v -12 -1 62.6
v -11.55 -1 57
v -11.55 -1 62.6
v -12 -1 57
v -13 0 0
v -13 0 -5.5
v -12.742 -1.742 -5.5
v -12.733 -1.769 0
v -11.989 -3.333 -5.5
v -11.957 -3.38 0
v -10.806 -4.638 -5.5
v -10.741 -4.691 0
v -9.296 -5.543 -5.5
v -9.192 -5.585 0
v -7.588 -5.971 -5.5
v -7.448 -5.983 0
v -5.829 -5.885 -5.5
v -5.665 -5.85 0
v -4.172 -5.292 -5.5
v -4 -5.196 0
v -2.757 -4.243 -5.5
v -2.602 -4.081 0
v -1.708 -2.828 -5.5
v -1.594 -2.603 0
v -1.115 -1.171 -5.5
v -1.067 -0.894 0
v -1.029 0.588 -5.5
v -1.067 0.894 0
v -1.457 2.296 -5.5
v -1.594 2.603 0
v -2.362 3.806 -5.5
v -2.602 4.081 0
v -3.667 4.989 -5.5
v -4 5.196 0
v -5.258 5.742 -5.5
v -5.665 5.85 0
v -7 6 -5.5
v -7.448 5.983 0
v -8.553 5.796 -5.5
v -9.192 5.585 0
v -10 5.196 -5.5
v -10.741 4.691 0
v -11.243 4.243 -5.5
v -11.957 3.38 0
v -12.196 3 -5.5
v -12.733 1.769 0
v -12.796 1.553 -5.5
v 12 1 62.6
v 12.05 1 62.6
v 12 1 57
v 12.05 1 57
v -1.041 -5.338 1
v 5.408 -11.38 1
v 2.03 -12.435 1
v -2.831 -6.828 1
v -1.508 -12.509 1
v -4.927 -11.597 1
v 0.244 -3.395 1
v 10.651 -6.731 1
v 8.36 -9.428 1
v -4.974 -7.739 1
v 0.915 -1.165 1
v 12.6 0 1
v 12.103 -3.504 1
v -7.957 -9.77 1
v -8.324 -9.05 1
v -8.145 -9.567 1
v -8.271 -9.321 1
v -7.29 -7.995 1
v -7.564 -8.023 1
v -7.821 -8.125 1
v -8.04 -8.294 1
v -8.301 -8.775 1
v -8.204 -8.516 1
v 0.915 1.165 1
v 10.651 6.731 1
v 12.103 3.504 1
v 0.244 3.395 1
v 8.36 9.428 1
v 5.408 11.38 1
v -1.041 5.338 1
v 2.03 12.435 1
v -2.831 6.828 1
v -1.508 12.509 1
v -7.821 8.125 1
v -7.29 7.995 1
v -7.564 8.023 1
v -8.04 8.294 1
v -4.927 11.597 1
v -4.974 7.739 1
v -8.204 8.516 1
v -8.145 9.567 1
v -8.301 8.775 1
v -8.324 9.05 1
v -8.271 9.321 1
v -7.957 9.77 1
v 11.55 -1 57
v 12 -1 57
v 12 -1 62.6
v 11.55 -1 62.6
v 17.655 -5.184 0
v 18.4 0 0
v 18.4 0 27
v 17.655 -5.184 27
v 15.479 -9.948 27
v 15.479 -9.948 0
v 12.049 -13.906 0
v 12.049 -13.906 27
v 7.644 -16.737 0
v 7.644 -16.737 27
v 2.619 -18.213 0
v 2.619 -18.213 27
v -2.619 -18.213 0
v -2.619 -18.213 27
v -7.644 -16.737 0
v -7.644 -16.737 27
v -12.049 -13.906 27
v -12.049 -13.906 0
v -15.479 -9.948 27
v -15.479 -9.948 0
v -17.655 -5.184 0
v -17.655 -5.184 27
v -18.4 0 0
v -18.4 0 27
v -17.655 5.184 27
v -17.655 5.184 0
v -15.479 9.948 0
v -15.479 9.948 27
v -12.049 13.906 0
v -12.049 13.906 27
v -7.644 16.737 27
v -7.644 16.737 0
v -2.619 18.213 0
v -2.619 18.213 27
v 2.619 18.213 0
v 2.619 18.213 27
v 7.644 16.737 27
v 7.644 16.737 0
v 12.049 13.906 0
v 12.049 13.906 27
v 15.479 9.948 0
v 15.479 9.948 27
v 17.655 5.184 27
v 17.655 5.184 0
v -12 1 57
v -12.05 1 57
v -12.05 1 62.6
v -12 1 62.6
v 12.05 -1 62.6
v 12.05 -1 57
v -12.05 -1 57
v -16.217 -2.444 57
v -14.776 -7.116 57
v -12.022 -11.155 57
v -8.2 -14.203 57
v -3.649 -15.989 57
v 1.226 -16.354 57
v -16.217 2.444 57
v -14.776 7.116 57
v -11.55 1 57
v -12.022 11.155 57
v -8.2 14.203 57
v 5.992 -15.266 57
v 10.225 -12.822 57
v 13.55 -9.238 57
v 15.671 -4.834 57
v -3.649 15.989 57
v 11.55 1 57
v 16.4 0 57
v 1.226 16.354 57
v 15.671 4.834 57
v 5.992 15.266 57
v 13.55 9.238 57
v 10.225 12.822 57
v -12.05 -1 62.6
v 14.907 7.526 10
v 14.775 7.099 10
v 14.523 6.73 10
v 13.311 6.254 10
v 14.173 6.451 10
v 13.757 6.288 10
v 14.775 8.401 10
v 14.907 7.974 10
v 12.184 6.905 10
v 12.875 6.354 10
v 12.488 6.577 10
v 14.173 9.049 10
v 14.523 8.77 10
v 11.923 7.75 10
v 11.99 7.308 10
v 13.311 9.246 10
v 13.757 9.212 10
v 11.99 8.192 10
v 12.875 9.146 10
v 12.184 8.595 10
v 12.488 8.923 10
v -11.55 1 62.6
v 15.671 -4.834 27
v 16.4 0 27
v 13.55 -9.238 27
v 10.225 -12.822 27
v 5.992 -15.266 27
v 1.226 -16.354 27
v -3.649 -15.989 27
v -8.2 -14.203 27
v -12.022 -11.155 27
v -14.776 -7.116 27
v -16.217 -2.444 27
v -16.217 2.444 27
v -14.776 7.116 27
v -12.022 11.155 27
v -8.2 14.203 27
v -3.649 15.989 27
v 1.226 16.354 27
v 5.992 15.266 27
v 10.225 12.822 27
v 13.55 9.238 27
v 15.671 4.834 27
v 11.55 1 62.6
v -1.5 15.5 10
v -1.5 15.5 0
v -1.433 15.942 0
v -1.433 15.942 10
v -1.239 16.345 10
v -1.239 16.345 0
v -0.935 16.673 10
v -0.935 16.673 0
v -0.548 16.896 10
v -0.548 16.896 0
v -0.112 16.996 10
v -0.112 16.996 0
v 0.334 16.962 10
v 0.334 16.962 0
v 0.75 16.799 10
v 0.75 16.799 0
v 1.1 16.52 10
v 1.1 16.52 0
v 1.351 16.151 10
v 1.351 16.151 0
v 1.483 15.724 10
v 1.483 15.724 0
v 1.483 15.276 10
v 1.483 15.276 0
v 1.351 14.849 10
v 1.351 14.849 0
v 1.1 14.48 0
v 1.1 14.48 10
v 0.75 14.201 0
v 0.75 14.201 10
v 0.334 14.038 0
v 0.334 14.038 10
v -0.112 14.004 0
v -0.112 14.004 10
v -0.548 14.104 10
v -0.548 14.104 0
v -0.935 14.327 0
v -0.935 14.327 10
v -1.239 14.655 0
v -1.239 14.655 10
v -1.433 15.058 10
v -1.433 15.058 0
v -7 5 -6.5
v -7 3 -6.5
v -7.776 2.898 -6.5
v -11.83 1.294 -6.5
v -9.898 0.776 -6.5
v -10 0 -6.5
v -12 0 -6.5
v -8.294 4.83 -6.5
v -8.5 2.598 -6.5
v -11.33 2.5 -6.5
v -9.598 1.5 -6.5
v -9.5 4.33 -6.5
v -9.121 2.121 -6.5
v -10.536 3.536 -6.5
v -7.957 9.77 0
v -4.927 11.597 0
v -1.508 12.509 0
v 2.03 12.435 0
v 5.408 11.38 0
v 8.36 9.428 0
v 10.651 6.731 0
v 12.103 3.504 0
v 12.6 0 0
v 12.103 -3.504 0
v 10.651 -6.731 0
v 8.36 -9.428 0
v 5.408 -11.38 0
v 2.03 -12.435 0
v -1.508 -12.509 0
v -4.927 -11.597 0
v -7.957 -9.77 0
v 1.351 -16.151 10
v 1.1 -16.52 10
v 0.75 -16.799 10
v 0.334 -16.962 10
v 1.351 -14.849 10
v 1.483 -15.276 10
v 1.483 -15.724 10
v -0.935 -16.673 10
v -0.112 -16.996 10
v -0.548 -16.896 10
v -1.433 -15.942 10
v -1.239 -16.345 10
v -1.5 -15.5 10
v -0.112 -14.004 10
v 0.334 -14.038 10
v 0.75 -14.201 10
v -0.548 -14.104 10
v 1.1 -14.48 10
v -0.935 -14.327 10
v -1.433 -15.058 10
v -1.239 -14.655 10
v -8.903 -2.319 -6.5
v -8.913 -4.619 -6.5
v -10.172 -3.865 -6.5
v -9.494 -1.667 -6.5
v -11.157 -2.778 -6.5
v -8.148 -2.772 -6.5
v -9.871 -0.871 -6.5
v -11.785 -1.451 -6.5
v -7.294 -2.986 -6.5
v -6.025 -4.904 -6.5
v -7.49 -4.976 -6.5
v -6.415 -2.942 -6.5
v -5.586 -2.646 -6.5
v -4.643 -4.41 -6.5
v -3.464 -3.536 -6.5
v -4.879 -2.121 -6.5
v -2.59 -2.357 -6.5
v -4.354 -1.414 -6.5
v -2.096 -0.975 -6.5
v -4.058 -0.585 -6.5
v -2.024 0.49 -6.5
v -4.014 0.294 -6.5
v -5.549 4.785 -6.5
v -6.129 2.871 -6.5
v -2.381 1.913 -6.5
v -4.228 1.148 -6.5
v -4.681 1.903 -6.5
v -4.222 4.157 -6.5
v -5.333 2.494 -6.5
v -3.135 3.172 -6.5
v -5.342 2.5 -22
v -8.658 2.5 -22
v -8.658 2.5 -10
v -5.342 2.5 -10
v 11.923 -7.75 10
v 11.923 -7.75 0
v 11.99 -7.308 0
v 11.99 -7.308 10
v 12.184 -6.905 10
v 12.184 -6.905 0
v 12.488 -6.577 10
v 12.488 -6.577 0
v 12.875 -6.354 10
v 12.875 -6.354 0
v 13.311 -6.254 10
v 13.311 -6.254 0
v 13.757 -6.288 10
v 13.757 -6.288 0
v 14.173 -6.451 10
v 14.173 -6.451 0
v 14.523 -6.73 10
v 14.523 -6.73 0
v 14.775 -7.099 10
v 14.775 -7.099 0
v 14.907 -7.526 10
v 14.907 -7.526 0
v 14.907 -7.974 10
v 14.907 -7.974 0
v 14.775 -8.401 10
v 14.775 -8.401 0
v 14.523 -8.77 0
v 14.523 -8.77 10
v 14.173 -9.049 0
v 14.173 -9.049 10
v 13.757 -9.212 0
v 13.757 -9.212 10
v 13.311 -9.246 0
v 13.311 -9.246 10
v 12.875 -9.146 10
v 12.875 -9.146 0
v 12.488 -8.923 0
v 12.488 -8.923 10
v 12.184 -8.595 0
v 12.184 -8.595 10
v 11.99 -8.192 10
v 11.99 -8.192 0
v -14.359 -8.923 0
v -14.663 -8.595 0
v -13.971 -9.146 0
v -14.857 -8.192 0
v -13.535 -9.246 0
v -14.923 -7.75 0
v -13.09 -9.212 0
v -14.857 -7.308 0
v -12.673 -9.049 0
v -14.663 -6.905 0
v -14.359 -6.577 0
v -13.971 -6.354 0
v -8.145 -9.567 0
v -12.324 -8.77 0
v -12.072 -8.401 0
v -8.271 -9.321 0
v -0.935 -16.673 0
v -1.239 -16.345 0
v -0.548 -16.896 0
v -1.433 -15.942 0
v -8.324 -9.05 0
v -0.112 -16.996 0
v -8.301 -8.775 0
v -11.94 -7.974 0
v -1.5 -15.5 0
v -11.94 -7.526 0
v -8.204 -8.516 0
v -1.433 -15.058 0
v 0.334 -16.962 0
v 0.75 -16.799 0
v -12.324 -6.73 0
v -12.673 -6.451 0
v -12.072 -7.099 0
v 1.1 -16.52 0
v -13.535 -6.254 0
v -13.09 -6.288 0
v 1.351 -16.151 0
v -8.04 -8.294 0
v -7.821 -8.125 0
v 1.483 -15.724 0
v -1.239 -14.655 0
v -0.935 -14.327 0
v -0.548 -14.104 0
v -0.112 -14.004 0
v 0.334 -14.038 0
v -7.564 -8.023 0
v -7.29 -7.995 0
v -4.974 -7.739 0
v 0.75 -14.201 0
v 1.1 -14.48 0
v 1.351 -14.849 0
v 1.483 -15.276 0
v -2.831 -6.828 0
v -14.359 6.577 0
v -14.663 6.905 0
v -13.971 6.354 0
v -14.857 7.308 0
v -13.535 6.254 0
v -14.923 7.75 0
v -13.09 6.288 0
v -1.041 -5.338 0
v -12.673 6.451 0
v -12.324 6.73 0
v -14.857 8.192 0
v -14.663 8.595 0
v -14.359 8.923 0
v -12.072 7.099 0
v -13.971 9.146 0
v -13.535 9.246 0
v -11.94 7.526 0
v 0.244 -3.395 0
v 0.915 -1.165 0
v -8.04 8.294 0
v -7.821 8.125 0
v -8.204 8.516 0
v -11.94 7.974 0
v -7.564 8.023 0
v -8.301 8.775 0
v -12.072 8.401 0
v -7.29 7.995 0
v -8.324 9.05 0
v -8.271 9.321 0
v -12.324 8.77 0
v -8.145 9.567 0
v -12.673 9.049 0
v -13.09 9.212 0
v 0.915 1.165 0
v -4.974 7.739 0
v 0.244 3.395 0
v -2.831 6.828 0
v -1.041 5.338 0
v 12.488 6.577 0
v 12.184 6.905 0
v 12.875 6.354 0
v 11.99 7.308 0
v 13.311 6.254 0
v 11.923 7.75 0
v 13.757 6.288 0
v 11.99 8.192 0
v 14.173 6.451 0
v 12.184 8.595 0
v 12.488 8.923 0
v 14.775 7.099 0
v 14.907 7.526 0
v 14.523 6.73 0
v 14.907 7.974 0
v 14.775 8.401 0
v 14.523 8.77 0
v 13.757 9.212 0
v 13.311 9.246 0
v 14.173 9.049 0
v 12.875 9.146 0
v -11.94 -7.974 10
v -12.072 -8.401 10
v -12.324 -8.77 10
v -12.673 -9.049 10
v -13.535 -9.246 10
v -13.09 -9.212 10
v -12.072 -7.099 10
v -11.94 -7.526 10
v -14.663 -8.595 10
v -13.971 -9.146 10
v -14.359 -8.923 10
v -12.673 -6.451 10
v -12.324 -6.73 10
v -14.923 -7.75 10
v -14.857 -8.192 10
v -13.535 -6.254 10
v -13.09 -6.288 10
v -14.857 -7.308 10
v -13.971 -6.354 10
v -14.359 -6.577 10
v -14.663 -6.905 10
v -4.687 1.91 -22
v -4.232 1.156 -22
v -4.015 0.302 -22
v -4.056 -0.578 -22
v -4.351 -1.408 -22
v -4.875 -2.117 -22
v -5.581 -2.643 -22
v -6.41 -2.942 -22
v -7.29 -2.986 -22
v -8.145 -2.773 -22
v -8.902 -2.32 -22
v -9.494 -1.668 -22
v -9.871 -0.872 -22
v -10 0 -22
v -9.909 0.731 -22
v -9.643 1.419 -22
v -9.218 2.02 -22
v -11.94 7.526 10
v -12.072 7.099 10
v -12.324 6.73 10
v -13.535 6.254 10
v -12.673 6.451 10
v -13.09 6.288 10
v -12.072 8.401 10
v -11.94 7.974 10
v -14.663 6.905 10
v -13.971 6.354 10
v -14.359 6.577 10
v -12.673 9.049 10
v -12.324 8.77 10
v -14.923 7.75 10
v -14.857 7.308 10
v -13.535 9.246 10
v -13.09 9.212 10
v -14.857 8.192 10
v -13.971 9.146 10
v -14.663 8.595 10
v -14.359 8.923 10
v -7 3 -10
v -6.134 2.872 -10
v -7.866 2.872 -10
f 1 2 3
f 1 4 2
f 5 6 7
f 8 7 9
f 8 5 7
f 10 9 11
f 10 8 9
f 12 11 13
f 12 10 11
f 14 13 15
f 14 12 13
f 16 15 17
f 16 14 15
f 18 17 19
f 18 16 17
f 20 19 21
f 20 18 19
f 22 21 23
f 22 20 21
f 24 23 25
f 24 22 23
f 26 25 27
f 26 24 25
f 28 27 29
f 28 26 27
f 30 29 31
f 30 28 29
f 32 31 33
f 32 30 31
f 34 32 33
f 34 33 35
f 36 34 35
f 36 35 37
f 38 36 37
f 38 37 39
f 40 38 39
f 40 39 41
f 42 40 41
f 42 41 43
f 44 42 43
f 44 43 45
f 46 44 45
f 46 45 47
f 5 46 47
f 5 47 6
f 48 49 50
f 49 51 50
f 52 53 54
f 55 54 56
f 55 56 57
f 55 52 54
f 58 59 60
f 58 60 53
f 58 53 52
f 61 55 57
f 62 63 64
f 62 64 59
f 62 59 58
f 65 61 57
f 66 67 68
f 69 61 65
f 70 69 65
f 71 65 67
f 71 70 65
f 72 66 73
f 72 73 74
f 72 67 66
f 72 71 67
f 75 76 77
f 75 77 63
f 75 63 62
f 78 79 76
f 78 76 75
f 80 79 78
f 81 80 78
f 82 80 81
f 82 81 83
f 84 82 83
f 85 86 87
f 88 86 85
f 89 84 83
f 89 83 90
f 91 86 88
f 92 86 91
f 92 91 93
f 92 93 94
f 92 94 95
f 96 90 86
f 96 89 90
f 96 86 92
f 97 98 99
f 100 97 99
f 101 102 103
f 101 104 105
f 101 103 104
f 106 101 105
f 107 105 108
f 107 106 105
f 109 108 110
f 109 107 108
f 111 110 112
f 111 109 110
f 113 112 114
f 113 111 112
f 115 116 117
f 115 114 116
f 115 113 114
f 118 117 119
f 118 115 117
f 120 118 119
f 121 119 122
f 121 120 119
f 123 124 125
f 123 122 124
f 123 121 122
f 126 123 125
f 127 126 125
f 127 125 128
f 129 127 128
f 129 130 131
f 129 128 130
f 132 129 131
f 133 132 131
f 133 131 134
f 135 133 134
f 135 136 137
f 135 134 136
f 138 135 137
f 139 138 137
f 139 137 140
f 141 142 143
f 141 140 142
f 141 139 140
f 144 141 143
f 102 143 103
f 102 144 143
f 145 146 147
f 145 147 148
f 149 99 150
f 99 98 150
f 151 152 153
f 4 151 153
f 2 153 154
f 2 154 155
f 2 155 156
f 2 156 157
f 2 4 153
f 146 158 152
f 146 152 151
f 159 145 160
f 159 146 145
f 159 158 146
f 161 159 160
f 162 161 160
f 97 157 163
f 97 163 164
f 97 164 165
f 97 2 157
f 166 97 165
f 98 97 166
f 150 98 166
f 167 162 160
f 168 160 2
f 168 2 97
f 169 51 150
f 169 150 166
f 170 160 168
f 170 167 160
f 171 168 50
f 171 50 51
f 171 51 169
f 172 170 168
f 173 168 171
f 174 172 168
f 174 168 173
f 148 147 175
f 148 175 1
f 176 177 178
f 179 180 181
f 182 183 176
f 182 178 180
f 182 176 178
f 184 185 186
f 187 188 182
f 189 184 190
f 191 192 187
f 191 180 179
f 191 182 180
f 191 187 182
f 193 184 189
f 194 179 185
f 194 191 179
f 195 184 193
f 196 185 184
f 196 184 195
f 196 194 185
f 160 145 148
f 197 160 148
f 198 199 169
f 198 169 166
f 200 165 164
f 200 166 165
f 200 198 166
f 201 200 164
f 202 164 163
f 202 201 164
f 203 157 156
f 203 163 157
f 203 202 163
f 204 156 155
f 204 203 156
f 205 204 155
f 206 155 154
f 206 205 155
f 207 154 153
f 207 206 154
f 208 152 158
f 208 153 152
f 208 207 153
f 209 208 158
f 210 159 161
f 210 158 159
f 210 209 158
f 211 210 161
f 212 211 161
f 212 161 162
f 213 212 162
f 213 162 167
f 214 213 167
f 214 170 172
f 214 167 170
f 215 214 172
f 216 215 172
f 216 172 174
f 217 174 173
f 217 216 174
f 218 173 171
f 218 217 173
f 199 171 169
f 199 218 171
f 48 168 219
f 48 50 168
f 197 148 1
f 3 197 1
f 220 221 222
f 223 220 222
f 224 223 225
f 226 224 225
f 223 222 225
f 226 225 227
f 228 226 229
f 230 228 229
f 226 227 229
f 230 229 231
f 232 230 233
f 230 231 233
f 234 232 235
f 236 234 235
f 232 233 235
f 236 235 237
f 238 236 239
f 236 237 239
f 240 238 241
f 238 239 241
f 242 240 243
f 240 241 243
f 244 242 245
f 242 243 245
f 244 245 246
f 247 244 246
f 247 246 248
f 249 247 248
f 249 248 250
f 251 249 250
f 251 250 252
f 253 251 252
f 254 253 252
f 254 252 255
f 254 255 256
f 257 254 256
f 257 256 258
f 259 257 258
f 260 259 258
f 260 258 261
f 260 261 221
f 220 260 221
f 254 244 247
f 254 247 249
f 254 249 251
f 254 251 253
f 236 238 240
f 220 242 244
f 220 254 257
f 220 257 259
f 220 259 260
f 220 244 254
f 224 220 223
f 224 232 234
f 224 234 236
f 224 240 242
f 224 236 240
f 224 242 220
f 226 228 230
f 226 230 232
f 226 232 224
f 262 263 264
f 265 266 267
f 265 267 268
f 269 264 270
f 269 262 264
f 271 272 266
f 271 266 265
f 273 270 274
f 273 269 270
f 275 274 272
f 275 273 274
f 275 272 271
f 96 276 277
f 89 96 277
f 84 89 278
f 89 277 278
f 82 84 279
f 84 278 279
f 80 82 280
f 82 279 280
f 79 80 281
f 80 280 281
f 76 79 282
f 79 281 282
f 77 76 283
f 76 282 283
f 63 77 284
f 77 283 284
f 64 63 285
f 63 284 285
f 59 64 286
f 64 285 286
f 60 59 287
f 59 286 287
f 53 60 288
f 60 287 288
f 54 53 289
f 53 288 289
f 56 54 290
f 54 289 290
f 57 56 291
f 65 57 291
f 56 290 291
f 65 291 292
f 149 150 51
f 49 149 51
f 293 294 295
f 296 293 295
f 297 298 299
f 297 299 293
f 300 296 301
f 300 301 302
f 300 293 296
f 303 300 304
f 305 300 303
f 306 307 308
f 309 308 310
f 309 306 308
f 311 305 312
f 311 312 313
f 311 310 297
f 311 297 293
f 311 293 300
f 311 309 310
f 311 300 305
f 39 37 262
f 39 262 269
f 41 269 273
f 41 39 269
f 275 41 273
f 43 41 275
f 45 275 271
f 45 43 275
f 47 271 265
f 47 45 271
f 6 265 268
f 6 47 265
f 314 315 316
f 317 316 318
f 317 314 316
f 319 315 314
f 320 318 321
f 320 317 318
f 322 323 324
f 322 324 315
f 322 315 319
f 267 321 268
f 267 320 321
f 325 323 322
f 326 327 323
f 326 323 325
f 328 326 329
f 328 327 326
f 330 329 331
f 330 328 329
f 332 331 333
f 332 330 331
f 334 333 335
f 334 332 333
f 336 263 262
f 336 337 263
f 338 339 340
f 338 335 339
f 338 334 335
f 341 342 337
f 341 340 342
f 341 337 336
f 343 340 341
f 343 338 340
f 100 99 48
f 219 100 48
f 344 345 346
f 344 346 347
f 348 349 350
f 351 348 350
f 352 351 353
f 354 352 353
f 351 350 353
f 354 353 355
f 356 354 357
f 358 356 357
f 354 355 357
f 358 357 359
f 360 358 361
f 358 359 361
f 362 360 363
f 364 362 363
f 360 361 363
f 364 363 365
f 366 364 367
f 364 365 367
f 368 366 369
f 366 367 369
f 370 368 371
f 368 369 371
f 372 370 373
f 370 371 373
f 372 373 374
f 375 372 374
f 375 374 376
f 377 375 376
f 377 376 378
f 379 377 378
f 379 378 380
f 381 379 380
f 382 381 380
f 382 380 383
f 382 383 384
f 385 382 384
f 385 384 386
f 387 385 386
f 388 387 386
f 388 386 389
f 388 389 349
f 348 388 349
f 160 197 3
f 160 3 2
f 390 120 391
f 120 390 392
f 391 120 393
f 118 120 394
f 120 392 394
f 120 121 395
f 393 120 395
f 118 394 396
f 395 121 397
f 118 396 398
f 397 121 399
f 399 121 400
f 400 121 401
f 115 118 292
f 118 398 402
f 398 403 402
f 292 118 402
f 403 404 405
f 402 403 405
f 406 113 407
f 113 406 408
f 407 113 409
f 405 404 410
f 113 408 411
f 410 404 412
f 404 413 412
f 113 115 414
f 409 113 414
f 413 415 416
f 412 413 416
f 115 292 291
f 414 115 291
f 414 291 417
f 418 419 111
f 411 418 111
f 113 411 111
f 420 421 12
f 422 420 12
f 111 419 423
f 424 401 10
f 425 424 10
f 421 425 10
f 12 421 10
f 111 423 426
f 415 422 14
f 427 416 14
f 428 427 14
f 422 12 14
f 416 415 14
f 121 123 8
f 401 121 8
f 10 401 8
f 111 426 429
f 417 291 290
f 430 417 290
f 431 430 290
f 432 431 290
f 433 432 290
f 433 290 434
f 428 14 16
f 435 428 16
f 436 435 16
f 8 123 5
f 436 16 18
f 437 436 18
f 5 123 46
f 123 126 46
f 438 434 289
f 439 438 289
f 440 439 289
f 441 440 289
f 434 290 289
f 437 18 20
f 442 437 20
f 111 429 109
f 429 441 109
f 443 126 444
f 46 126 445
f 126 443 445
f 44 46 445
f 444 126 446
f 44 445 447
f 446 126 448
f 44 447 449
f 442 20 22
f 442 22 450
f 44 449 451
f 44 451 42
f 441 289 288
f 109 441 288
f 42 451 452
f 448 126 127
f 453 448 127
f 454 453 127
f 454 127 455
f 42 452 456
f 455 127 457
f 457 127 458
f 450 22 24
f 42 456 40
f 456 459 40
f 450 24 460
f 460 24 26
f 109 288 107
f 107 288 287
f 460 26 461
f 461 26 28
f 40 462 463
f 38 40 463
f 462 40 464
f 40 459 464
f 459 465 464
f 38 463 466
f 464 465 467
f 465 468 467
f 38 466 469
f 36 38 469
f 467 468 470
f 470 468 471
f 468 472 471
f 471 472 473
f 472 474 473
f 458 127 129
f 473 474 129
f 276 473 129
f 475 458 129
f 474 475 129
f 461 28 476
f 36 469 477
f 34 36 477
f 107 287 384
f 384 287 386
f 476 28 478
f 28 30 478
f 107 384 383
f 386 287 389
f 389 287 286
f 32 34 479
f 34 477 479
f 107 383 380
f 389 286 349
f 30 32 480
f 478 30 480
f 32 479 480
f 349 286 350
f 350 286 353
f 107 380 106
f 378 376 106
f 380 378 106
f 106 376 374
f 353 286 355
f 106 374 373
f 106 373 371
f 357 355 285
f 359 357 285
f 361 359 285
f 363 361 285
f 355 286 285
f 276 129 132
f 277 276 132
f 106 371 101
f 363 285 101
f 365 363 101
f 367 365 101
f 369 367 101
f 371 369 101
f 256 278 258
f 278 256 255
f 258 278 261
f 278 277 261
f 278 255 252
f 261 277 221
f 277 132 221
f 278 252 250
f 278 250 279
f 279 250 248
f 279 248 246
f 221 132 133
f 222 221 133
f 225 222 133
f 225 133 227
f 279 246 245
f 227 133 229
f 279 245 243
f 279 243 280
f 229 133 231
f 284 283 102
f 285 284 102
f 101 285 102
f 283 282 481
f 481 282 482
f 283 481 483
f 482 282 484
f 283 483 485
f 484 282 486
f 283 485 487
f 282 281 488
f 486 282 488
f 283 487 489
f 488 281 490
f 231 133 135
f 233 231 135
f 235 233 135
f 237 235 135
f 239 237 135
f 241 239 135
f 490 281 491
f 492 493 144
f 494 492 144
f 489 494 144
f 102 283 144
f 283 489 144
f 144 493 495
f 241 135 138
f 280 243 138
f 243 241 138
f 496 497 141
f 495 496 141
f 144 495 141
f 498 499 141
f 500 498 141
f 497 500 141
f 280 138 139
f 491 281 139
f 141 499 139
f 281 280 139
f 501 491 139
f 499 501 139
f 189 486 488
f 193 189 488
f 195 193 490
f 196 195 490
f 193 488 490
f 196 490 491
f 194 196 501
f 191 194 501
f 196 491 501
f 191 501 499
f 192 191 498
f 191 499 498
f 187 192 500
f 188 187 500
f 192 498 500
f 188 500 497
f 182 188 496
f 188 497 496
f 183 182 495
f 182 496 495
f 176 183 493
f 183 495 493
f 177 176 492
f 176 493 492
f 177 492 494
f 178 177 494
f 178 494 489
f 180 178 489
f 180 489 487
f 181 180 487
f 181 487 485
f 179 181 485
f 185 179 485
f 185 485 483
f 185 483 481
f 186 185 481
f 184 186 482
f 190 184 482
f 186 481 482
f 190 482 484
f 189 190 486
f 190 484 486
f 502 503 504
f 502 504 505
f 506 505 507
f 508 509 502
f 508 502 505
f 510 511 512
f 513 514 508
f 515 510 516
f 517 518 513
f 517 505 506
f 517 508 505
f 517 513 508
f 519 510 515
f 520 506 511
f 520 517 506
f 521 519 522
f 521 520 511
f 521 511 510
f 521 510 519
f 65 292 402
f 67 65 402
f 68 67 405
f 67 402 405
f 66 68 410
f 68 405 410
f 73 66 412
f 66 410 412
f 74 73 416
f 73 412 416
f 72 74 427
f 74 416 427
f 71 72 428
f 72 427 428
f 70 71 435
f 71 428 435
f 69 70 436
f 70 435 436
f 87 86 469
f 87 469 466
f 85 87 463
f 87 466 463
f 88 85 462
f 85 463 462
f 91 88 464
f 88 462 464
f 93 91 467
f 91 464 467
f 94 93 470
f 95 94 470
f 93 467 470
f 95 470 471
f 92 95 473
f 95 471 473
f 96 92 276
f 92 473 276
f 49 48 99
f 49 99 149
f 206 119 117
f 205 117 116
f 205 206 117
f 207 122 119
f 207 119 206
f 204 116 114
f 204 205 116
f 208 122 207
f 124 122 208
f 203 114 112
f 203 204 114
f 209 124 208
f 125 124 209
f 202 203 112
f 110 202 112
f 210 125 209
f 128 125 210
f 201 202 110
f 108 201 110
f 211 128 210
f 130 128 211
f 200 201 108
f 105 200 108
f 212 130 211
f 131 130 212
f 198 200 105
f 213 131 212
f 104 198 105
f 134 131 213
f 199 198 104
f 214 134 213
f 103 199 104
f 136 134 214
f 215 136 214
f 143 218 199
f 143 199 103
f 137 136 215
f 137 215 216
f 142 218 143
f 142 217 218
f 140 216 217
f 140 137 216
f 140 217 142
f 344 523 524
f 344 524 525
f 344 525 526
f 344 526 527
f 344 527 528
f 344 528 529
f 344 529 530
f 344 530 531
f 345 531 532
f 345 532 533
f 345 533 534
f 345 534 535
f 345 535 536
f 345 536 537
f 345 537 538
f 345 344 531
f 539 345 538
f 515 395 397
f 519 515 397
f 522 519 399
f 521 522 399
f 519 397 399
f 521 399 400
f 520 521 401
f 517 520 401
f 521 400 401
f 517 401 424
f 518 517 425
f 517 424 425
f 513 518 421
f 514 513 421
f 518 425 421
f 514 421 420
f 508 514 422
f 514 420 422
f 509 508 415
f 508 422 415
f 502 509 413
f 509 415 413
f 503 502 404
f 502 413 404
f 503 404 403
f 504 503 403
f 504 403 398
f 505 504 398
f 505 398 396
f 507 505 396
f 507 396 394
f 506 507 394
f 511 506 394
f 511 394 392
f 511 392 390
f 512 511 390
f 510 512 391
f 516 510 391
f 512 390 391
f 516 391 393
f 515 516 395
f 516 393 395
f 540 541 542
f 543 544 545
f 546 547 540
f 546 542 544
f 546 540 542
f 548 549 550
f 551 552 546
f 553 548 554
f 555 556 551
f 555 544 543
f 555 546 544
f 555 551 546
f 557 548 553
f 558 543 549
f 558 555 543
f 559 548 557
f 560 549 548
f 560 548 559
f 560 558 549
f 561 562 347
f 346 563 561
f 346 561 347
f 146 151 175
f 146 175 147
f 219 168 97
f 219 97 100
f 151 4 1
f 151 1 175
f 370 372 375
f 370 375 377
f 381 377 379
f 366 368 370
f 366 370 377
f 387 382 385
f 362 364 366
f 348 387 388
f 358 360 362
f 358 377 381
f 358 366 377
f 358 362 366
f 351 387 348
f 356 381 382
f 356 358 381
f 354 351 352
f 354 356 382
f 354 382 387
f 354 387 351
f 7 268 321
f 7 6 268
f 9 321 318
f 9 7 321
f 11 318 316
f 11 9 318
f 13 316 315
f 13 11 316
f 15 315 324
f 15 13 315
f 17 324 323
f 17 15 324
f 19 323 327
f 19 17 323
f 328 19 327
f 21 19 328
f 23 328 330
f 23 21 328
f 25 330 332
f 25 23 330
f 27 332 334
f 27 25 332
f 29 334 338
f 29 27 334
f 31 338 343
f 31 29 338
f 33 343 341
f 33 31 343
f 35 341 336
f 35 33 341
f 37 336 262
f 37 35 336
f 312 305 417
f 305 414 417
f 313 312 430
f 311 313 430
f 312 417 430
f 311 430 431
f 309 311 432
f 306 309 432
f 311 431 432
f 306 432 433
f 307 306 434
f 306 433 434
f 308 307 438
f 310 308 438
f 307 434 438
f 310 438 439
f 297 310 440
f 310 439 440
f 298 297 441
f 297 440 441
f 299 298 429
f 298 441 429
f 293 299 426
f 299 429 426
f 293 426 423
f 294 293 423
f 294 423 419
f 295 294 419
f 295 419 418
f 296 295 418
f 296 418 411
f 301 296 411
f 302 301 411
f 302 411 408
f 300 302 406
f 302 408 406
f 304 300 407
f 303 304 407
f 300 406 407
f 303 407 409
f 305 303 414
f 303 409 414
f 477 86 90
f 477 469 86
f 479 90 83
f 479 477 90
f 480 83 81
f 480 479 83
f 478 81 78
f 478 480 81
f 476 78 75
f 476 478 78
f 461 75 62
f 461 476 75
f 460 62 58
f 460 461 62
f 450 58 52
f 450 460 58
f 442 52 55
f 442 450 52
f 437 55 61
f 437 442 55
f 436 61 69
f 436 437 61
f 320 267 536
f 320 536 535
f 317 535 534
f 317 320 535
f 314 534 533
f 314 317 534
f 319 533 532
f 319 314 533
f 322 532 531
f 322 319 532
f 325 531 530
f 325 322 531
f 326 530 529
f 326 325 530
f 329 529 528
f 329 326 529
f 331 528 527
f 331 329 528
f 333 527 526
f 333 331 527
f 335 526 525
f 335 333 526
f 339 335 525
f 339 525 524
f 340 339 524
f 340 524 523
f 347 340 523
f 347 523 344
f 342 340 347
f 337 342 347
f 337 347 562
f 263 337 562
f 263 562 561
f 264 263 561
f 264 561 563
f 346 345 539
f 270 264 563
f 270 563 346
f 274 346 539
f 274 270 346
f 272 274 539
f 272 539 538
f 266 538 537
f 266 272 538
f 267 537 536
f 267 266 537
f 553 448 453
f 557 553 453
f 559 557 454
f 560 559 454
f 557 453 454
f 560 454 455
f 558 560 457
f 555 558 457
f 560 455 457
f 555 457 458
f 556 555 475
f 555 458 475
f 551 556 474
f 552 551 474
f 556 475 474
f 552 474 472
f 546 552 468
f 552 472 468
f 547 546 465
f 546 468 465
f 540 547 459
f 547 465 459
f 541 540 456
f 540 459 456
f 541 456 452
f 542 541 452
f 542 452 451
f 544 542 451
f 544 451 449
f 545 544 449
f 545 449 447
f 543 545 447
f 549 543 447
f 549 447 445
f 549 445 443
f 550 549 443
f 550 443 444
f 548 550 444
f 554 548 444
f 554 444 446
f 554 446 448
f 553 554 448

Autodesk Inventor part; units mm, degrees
ref_plane "YZ Plane" through (0, 0, 0) normal (1, 0, 0) x (0, 1, 0)
ref_plane "XZ Plane" through (0, 0, 0) normal (0, 1, 0) x (-1, 0, 0)
ref_plane "XY Plane" through (0, 0, 0) normal (0, 0, 1) x (1, 0, 0)
sketch "Boceto1" plane through (0, 0, 0) normal (0, 0, 1) x (1, 0, 0)
  circle A0 centre (0, 0) radius 18.4
  dimension "d0" = 36.8
extrude "Extrusión1" add sketch "Boceto1" along normal blind 27
sketch "Boceto2" plane through (0, 0, 27) normal (0, 0, 1) x (1, 0, 0)
  circle A0 centre (0, 0) radius 18.4 projected
  circle A1 centre (0, 0) radius 16.4
  dimension "d4" = 2
extrude "Extrusión2" add sketch "Boceto2" along normal blind 30 contours A1
sketch "Boceto3" plane through (0, 0, 57) normal (0, 0, 1) x (1, 0, 0)
  circle A0 centre (0, 0) radius 16.4 projected
  line L0 (0, 0) -> (12.05, 0)
  line L1 (0, 0) -> (-12.05, 0)
  line L2 (-12.05, 0) -> (-12.05, 1)
  line L3 (-12.05, 1) -> (-12, 1)
  line L4 (-12, 1) -> (-12, -1)
  line L5 (-12, -1) -> (-12.05, -1)
  line L6 (-12.05, -1) -> (-12.05, 0)
  line L7 (12.05, 0) -> (12.05, 1)
  line L8 (12.05, 1) -> (12, 1)
  line L9 (12, 1) -> (12, -1)
  line L10 (12, -1) -> (12.05, -1)
  line L11 (12.05, -1) -> (12.05, 0)
  dimension "d7" = 12.05
  dimension "d8" = 12.05
extrude "Extrusión3" add sketch "Boceto3" along normal blind 5.6 contours L9 L8 L7 L0 | L0 L11 L10 L9 | L4 L5 L6 L1 | L1 L2 L3 L4
sketch "Boceto4" plane through (0, 0, 0) normal (0, 0, -1) x (-1, 0, 0)
  circle A0 centre (13.4234, -7.75) radius 1.5
  circle A1 centre (13.4234, 7.75) radius 1.5
  circle A2 centre (0, 15.5) radius 1.5
  circle A3 centre (-13.4234, 7.75) radius 1.5
  circle A4 centre (-13.4234, -7.75) radius 1.5
  circle A5 centre (0, -15.5) radius 1.5
  line L0 (0, 0) -> (7, 0)
  circle A6 centre (7, 0) radius 6
  arc A7 (7.2895, 7.9948) -> (7.2895, -7.9948) centre (7, 0) ccw
  arc A8 (7.9572, 9.7695) -> (7.9572, -9.7695) centre (0, 0) ccw
  arc A9 (7.9572, -9.7695) -> (7.2895, -7.9948) centre (7.3257, -8.9941) ccw
  arc A10 (7.2895, 7.9948) -> (7.9572, 9.7695) centre (7.3257, 8.9941) ccw
  dimension "d19" = 7
  dimension "d20" = 12
  dimension "d34" = 1
extrude "Extrusión4" add sketch "Boceto4" along normal blind 6 contours A6
sketch "Boceto5" plane through (-7, 0, -6) normal (0, 0, -1) x (-1, 0, 0)
  circle A0 centre (0, 0) radius 6 projected
  line L0 (6, 0) -> (0, 0)
  line L1 (0, 6) -> (0, 0)
extrude "Extrusión5" add sketch "Boceto5" along normal blind 0.5 contours L0 L1 A0 picked at (3.9499, 0.445)
sketch "Boceto6" plane through (0, 0, -6) normal (0, 0, -1) x (-1, 0, 0)
  line L0 (13, 0) -> (7, 0) projected
  line L1 (7, 0) -> (7, 6) projected
  arc A0 (7, 6) -> (13, 0) centre (7, 0) ccw projected
extrude "Extrusión6" cut sketch "Boceto6" against normal blind 0.5
sketch "Boceto7" plane through (-7, 0, -6.5) normal (1, 0, 0) x (0, 0, -1)
  line L0 (0, 0) -> (0, 6) projected
  line L1 (-1, 0) -> (0, 0) projected
  line L2 (-1, 6) -> (0, 5)
  line L3 (0, 5) -> (0, 6)
  line L4 (-1, 6) -> (0, 5)
  line L5 (-1, 6) -> (0, 6)
  line L6 (-1, 6) -> (0, 5)
  line L7 (0, 5) -> (-1, 6)
revolve "Revolución1" cut sketch "Boceto7" angle 360 about axis through (-7, 0, -5.5) along (0, 0, -1)
sketch "Boceto8" plane through (-7, 0, -5.5) normal (1, 0, 0) x (0, 0, -1)
  line L0 (1, 5) -> (0, 6) projected
  line L1 (0, 0) -> (0, 6) projected
  line L2 (0, 0) -> (1, 0) projected
  line L3 (1, 0) -> (1, 5) projected
revolve "Revolución2" add sketch "Boceto8" angle 360 about axis through (-7, 0, -5.5) along (0, 0, -1)
sketch "Boceto9" plane through (-7, 0, -6.5) normal (0, 0, -1) x (-1, 0, 0)
  circle A0 centre (0, 0) radius 5 projected
  circle A1 centre (0, 0) radius 3
extrude "Extrusión7" add sketch "Boceto9" along normal blind 15.5 contours A1
sketch "Boceto10" plane through (-7, 0, -22) normal (0, 0, -1) x (-1, 0, 0)
  circle A0 centre (0, 0) radius 3 projected
  line L0 (1.6583, 2.5) -> (-1.6583, 2.5)
extrude "Extrusión8" cut sketch "Boceto10" against normal blind 12 contours L0 A0 picked at (-0.1169, 2.6598)
extrude "Extrusión9" cut sketch "Boceto4" against normal blind 1 contours A7 A9 A8 A10
extrude "Extrusión10" cut sketch "Boceto4" against normal blind 10 contours A0 | A1 | A2 | A3 | A4 | A5
sketch "Boceto12" plane through (-12, -1, 57) normal (1, 0, 0) x (0, 0, -1)
  line L0 (-5.6, 2) -> (-5.6, 0) projected
  line L1 (0, 0) -> (-5.6, 0) projected
  line L2 (0, 2) -> (0, 0) projected
  line L3 (0, 2) -> (-5.6, 2) projected
extrude "Extrusión11" add sketch "Boceto12" along normal blind 0.45
sketch "Boceto13" plane through (12, -1, 57) normal (-1, 0, 0) x (0, 0, 1)
  line L0 (5.6, 0) -> (5.6, 2) projected
  line L1 (0, 2) -> (5.6, 2) projected
  line L2 (0, 0) -> (0, 2) projected
  line L3 (0, 0) -> (5.6, 0) projected
extrude "Extrusión12" add sketch "Boceto13" along normal blind 0.45
sketch "Boceto14" plane through (0, 0, 0) normal (0, 0, -1) x (-1, 0, 0)
  circle A0 centre (0, -15.5) radius 1.5 projected
  circle A1 centre (-13.4234, -7.75) radius 1.5 projected
  circle A2 centre (-13.4234, 7.75) radius 1.5 projected
  circle A3 centre (13.4234, 7.75) radius 1.5 projected
  circle A4 centre (13.4234, -7.75) radius 1.5 projected
  circle A5 centre (0, 15.5) radius 1.5 projected
  arc A6 (7.2895, 7.9948) -> (7.2895, -7.9948) centre (7, 0) ccw projected
  arc A7 (7.9572, -9.7695) -> (7.2895, -7.9948) centre (7.3257, -8.9941) ccw projected
  arc A8 (7.9572, 9.7695) -> (7.9572, -9.7695) centre (0, 0) ccw projected
  arc A9 (7.2895, 7.9948) -> (7.9572, 9.7695) centre (7.3257, 8.9941) ccw projected
  circle A10 centre (7, 0) radius 6 projected
  circle A11 centre (0, 0) radius 18.4 projected
sketch "Boceto15" plane through (-7, 0, -22) normal (0, 0, -1) x (-1, 0, 0)
  line L0 (1.6583, 2.5) -> (-1.6583, 2.5) projected
  arc A0 (-1.6583, 2.5) -> (1.6583, 2.5) centre (0, 0) ccw projected
properties part number "37D"
